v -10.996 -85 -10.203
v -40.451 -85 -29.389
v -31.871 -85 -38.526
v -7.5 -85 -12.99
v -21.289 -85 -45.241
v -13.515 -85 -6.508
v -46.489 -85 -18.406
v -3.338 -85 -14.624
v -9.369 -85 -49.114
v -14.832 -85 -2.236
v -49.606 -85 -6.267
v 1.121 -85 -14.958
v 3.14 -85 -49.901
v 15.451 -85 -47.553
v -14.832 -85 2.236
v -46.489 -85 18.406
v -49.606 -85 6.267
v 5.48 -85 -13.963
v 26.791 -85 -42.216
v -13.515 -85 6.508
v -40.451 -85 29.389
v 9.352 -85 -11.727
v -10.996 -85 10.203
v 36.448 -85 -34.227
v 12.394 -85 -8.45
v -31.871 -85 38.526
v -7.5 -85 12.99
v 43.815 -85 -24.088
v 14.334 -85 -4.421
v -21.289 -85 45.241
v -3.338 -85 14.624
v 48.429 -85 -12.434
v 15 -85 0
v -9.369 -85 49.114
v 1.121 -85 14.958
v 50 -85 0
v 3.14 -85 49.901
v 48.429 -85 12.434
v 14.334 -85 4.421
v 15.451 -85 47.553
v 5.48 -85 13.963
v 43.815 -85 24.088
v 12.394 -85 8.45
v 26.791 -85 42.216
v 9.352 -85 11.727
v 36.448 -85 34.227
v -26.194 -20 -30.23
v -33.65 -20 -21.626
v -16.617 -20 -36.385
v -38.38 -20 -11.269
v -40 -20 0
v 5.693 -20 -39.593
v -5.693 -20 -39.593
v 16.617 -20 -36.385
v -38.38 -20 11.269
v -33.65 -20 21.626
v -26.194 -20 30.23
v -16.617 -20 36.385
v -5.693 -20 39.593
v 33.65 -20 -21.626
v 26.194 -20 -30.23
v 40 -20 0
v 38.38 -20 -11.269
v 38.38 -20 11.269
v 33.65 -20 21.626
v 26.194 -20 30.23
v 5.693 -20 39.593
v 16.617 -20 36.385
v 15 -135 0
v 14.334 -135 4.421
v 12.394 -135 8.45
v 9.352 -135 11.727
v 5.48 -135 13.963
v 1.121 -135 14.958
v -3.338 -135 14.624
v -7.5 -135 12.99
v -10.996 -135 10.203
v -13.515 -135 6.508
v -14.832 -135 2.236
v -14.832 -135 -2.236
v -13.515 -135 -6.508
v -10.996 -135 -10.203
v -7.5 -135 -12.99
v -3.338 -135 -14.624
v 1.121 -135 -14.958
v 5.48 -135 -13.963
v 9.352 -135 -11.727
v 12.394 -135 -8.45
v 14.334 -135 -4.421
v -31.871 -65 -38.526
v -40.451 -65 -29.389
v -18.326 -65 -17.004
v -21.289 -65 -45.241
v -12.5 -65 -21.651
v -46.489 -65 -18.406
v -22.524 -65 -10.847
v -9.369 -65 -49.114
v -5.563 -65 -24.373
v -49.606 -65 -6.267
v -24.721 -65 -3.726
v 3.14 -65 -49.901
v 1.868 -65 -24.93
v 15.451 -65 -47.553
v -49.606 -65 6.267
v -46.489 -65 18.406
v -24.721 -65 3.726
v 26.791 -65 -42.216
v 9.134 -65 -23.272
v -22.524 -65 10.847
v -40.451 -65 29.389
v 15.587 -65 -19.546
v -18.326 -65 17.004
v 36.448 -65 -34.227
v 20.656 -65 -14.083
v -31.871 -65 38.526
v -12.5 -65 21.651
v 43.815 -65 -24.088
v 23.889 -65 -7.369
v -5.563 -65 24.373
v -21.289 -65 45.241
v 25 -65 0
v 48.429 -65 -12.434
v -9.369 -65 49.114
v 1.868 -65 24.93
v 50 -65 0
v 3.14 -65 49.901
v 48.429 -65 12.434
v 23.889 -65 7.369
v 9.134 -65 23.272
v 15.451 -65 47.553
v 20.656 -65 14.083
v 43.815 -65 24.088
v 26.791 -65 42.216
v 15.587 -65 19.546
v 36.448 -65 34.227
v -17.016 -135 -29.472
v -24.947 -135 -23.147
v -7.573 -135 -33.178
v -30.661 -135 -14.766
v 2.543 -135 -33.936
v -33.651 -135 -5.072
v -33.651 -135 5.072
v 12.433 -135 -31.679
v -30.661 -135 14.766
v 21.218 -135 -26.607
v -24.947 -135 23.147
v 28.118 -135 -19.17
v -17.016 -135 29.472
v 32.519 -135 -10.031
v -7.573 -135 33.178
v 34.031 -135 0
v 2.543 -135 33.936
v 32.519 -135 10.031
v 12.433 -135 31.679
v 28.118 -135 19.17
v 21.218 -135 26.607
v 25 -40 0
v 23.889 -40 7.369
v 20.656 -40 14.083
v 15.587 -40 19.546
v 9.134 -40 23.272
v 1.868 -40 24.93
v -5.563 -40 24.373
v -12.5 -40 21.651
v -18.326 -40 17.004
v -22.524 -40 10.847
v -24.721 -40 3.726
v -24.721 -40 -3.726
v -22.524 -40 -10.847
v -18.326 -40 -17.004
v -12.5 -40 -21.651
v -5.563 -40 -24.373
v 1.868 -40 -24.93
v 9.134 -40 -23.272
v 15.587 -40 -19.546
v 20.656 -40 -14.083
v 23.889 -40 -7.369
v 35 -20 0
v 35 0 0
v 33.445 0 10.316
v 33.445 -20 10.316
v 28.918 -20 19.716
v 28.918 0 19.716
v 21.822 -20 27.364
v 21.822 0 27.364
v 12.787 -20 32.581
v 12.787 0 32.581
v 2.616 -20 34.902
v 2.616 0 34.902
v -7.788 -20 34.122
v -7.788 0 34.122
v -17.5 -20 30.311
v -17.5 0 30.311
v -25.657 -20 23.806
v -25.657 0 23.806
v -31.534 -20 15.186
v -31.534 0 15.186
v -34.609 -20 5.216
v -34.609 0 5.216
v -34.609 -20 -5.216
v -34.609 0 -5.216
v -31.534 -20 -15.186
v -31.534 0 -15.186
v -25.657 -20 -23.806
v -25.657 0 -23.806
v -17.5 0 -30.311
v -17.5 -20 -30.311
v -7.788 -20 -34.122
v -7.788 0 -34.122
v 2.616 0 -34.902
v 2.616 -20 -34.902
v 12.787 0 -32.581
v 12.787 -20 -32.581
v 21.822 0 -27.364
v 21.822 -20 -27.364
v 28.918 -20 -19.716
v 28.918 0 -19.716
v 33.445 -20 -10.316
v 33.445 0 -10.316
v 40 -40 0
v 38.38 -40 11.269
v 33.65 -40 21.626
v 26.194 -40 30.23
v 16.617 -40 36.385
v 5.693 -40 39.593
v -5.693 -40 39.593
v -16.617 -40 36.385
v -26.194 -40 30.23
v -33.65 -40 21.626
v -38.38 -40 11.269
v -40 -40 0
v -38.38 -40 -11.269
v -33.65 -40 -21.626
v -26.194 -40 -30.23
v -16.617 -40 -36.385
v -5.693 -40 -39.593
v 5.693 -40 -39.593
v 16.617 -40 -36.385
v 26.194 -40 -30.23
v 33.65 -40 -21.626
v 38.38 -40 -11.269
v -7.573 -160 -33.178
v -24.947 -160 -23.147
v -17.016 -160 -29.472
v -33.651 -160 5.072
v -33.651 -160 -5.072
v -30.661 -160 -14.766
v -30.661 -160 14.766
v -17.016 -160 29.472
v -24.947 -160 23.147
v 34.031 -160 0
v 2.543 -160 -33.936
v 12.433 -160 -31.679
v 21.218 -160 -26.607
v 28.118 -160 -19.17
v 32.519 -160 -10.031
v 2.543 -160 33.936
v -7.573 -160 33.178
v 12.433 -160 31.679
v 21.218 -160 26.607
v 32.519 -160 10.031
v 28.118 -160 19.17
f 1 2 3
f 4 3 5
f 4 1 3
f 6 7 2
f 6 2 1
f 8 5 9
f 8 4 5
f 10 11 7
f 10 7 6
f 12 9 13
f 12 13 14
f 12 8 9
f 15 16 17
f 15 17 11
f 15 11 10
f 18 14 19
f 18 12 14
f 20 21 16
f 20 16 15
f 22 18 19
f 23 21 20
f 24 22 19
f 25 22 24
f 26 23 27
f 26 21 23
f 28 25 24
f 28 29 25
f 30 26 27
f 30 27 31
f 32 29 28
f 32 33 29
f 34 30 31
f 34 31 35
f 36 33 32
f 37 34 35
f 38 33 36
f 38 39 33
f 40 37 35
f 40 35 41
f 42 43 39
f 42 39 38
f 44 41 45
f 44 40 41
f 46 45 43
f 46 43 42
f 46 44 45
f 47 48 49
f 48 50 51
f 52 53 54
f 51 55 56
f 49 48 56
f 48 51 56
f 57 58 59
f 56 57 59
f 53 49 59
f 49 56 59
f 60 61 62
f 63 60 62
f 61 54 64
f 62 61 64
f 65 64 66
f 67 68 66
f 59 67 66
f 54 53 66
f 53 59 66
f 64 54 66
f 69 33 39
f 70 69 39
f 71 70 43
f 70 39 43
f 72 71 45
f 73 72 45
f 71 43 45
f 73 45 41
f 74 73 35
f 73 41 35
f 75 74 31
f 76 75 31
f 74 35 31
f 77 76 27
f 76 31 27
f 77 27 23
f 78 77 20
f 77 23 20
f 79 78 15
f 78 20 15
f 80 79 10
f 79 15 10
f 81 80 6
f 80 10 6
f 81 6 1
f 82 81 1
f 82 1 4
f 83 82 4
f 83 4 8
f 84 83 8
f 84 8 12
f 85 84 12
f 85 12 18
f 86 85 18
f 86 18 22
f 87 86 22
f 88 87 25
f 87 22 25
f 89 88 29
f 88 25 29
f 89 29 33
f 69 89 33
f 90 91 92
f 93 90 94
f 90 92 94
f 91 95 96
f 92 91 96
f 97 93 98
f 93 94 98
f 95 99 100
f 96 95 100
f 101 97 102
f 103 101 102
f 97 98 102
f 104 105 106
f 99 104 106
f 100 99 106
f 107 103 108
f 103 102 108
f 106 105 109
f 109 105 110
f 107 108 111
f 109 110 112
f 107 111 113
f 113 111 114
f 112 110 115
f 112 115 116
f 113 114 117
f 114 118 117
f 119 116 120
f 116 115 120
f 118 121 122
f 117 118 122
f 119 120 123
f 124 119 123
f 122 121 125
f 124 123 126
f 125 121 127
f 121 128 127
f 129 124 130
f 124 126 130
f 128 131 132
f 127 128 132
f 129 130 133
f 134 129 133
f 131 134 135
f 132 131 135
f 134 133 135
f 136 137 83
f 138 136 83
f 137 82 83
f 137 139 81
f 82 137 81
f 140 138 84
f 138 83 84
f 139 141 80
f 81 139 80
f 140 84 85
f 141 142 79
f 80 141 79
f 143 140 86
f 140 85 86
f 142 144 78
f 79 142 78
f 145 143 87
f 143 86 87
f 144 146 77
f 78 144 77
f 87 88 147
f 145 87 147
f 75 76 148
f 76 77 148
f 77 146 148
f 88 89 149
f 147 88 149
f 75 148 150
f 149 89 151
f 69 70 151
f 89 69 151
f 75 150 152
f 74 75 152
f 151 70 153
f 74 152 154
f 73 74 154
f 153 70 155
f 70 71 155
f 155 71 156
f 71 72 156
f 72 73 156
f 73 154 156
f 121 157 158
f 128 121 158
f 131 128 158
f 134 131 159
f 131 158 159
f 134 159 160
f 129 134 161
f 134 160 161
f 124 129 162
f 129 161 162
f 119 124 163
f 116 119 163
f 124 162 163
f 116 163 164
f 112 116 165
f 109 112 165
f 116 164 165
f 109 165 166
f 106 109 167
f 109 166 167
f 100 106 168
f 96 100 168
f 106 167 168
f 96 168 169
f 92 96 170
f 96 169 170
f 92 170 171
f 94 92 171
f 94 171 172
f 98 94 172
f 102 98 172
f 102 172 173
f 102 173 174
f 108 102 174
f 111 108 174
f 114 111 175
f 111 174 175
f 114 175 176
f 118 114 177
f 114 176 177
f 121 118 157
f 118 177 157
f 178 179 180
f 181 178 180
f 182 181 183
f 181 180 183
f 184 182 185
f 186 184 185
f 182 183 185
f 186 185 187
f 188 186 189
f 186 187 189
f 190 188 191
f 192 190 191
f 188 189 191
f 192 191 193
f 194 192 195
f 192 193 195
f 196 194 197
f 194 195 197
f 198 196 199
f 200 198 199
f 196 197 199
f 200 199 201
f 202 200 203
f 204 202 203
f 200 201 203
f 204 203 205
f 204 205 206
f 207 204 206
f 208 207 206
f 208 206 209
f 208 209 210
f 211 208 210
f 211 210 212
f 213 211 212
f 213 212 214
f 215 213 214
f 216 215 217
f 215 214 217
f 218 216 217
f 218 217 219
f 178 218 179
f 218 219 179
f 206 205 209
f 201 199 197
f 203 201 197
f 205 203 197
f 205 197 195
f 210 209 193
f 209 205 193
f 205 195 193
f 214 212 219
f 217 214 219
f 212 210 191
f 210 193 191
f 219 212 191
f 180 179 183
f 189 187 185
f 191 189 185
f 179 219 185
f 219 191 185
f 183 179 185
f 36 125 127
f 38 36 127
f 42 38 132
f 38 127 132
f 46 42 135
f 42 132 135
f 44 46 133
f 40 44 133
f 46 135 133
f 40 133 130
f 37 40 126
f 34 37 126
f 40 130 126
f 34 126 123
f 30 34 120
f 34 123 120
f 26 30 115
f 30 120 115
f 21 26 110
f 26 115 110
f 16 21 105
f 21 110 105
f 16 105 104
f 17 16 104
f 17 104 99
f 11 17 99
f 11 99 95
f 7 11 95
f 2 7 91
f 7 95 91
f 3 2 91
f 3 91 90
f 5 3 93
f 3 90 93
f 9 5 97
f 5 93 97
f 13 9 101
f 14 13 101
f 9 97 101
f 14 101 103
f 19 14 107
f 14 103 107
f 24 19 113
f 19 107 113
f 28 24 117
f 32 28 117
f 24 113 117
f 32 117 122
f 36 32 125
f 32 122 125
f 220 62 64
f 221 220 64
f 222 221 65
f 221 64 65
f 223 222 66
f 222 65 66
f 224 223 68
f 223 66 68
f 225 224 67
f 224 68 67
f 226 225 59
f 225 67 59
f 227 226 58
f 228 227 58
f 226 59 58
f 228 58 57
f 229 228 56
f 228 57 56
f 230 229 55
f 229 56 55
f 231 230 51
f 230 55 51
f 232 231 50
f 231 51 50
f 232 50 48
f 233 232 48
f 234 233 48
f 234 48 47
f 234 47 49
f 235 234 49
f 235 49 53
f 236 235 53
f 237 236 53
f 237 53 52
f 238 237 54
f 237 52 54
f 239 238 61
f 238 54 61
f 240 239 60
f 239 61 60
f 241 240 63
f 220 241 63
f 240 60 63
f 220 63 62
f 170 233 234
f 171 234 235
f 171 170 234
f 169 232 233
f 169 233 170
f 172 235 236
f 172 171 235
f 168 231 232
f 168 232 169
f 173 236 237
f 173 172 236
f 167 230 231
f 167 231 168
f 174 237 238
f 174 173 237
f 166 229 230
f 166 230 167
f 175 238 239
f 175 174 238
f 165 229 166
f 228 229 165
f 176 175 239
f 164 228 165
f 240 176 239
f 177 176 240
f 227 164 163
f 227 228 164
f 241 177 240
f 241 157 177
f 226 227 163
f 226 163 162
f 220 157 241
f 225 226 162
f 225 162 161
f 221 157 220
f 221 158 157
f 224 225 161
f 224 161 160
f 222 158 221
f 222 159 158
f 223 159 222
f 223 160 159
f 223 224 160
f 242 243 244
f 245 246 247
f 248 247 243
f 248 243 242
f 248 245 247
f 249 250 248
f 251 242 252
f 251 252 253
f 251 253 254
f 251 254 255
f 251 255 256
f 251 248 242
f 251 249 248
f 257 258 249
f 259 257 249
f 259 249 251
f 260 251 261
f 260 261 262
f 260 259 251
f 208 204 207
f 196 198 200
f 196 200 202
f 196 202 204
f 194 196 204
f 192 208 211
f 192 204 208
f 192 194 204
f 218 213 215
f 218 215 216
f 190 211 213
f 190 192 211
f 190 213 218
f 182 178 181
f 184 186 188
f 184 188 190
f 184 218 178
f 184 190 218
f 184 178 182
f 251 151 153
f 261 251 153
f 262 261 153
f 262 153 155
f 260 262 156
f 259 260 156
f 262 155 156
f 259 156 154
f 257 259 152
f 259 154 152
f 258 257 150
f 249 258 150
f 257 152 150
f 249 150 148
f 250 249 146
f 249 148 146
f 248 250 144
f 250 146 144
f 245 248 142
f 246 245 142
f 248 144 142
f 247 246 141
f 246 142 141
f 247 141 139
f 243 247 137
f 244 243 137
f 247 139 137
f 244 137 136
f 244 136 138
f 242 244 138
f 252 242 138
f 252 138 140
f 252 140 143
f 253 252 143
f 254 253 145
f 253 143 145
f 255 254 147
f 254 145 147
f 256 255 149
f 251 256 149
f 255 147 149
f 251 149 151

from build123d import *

# Parameters (mm, degrees)
F0_R      = 35
F1_DEPTH  = 20
F2_R      = 40
F2_R_2    = 35
F3_DEPTH  = 20
F4_R      = 25
F5_DEPTH  = 25
F6_R      = 50
F7_DEPTH  = 20
F8_R      = 15
F9_DEPTH  = 50
F10_R     = 34.0310746724
F10_R_2   = 15
F11_DEPTH = 25


with BuildPart() as f1:
    # F0 (on Front) → F1 (new body)
    with BuildSketch(Plane.XZ):
        Circle(F0_R)
    extrude(amount=F1_DEPTH)


with BuildPart() as f3:
    # F2 (on face) → F3 (new body)
    with BuildSketch(Plane.XZ.offset(20)):
        Circle(F2_R)
        Circle(F2_R_2, mode=Mode.SUBTRACT)
        Circle(F2_R_2)
    extrude(amount=F3_DEPTH)

    # F4 (on face) → F5 (join)
    with BuildSketch(Plane.XZ.offset(40)):
        Circle(F4_R)
    extrude(amount=F5_DEPTH)

    # F6 (on face) → F7 (join)
    with BuildSketch(Plane.XZ.offset(65)):
        Circle(F6_R)
    extrude(amount=F7_DEPTH)

    # F8 (on face) → F9 (join)
    with BuildSketch(Plane.XZ.offset(85)):
        Circle(F8_R)
    extrude(amount=F9_DEPTH)

    # F10 (on face) → F11 (join)
    with BuildSketch(Plane.XZ.offset(135)):
        Circle(F10_R)
        Circle(F10_R_2, mode=Mode.SUBTRACT)
        Circle(F10_R_2)
    extrude(amount=F11_DEPTH)


solid = Compound([f1.part, f3.part])
